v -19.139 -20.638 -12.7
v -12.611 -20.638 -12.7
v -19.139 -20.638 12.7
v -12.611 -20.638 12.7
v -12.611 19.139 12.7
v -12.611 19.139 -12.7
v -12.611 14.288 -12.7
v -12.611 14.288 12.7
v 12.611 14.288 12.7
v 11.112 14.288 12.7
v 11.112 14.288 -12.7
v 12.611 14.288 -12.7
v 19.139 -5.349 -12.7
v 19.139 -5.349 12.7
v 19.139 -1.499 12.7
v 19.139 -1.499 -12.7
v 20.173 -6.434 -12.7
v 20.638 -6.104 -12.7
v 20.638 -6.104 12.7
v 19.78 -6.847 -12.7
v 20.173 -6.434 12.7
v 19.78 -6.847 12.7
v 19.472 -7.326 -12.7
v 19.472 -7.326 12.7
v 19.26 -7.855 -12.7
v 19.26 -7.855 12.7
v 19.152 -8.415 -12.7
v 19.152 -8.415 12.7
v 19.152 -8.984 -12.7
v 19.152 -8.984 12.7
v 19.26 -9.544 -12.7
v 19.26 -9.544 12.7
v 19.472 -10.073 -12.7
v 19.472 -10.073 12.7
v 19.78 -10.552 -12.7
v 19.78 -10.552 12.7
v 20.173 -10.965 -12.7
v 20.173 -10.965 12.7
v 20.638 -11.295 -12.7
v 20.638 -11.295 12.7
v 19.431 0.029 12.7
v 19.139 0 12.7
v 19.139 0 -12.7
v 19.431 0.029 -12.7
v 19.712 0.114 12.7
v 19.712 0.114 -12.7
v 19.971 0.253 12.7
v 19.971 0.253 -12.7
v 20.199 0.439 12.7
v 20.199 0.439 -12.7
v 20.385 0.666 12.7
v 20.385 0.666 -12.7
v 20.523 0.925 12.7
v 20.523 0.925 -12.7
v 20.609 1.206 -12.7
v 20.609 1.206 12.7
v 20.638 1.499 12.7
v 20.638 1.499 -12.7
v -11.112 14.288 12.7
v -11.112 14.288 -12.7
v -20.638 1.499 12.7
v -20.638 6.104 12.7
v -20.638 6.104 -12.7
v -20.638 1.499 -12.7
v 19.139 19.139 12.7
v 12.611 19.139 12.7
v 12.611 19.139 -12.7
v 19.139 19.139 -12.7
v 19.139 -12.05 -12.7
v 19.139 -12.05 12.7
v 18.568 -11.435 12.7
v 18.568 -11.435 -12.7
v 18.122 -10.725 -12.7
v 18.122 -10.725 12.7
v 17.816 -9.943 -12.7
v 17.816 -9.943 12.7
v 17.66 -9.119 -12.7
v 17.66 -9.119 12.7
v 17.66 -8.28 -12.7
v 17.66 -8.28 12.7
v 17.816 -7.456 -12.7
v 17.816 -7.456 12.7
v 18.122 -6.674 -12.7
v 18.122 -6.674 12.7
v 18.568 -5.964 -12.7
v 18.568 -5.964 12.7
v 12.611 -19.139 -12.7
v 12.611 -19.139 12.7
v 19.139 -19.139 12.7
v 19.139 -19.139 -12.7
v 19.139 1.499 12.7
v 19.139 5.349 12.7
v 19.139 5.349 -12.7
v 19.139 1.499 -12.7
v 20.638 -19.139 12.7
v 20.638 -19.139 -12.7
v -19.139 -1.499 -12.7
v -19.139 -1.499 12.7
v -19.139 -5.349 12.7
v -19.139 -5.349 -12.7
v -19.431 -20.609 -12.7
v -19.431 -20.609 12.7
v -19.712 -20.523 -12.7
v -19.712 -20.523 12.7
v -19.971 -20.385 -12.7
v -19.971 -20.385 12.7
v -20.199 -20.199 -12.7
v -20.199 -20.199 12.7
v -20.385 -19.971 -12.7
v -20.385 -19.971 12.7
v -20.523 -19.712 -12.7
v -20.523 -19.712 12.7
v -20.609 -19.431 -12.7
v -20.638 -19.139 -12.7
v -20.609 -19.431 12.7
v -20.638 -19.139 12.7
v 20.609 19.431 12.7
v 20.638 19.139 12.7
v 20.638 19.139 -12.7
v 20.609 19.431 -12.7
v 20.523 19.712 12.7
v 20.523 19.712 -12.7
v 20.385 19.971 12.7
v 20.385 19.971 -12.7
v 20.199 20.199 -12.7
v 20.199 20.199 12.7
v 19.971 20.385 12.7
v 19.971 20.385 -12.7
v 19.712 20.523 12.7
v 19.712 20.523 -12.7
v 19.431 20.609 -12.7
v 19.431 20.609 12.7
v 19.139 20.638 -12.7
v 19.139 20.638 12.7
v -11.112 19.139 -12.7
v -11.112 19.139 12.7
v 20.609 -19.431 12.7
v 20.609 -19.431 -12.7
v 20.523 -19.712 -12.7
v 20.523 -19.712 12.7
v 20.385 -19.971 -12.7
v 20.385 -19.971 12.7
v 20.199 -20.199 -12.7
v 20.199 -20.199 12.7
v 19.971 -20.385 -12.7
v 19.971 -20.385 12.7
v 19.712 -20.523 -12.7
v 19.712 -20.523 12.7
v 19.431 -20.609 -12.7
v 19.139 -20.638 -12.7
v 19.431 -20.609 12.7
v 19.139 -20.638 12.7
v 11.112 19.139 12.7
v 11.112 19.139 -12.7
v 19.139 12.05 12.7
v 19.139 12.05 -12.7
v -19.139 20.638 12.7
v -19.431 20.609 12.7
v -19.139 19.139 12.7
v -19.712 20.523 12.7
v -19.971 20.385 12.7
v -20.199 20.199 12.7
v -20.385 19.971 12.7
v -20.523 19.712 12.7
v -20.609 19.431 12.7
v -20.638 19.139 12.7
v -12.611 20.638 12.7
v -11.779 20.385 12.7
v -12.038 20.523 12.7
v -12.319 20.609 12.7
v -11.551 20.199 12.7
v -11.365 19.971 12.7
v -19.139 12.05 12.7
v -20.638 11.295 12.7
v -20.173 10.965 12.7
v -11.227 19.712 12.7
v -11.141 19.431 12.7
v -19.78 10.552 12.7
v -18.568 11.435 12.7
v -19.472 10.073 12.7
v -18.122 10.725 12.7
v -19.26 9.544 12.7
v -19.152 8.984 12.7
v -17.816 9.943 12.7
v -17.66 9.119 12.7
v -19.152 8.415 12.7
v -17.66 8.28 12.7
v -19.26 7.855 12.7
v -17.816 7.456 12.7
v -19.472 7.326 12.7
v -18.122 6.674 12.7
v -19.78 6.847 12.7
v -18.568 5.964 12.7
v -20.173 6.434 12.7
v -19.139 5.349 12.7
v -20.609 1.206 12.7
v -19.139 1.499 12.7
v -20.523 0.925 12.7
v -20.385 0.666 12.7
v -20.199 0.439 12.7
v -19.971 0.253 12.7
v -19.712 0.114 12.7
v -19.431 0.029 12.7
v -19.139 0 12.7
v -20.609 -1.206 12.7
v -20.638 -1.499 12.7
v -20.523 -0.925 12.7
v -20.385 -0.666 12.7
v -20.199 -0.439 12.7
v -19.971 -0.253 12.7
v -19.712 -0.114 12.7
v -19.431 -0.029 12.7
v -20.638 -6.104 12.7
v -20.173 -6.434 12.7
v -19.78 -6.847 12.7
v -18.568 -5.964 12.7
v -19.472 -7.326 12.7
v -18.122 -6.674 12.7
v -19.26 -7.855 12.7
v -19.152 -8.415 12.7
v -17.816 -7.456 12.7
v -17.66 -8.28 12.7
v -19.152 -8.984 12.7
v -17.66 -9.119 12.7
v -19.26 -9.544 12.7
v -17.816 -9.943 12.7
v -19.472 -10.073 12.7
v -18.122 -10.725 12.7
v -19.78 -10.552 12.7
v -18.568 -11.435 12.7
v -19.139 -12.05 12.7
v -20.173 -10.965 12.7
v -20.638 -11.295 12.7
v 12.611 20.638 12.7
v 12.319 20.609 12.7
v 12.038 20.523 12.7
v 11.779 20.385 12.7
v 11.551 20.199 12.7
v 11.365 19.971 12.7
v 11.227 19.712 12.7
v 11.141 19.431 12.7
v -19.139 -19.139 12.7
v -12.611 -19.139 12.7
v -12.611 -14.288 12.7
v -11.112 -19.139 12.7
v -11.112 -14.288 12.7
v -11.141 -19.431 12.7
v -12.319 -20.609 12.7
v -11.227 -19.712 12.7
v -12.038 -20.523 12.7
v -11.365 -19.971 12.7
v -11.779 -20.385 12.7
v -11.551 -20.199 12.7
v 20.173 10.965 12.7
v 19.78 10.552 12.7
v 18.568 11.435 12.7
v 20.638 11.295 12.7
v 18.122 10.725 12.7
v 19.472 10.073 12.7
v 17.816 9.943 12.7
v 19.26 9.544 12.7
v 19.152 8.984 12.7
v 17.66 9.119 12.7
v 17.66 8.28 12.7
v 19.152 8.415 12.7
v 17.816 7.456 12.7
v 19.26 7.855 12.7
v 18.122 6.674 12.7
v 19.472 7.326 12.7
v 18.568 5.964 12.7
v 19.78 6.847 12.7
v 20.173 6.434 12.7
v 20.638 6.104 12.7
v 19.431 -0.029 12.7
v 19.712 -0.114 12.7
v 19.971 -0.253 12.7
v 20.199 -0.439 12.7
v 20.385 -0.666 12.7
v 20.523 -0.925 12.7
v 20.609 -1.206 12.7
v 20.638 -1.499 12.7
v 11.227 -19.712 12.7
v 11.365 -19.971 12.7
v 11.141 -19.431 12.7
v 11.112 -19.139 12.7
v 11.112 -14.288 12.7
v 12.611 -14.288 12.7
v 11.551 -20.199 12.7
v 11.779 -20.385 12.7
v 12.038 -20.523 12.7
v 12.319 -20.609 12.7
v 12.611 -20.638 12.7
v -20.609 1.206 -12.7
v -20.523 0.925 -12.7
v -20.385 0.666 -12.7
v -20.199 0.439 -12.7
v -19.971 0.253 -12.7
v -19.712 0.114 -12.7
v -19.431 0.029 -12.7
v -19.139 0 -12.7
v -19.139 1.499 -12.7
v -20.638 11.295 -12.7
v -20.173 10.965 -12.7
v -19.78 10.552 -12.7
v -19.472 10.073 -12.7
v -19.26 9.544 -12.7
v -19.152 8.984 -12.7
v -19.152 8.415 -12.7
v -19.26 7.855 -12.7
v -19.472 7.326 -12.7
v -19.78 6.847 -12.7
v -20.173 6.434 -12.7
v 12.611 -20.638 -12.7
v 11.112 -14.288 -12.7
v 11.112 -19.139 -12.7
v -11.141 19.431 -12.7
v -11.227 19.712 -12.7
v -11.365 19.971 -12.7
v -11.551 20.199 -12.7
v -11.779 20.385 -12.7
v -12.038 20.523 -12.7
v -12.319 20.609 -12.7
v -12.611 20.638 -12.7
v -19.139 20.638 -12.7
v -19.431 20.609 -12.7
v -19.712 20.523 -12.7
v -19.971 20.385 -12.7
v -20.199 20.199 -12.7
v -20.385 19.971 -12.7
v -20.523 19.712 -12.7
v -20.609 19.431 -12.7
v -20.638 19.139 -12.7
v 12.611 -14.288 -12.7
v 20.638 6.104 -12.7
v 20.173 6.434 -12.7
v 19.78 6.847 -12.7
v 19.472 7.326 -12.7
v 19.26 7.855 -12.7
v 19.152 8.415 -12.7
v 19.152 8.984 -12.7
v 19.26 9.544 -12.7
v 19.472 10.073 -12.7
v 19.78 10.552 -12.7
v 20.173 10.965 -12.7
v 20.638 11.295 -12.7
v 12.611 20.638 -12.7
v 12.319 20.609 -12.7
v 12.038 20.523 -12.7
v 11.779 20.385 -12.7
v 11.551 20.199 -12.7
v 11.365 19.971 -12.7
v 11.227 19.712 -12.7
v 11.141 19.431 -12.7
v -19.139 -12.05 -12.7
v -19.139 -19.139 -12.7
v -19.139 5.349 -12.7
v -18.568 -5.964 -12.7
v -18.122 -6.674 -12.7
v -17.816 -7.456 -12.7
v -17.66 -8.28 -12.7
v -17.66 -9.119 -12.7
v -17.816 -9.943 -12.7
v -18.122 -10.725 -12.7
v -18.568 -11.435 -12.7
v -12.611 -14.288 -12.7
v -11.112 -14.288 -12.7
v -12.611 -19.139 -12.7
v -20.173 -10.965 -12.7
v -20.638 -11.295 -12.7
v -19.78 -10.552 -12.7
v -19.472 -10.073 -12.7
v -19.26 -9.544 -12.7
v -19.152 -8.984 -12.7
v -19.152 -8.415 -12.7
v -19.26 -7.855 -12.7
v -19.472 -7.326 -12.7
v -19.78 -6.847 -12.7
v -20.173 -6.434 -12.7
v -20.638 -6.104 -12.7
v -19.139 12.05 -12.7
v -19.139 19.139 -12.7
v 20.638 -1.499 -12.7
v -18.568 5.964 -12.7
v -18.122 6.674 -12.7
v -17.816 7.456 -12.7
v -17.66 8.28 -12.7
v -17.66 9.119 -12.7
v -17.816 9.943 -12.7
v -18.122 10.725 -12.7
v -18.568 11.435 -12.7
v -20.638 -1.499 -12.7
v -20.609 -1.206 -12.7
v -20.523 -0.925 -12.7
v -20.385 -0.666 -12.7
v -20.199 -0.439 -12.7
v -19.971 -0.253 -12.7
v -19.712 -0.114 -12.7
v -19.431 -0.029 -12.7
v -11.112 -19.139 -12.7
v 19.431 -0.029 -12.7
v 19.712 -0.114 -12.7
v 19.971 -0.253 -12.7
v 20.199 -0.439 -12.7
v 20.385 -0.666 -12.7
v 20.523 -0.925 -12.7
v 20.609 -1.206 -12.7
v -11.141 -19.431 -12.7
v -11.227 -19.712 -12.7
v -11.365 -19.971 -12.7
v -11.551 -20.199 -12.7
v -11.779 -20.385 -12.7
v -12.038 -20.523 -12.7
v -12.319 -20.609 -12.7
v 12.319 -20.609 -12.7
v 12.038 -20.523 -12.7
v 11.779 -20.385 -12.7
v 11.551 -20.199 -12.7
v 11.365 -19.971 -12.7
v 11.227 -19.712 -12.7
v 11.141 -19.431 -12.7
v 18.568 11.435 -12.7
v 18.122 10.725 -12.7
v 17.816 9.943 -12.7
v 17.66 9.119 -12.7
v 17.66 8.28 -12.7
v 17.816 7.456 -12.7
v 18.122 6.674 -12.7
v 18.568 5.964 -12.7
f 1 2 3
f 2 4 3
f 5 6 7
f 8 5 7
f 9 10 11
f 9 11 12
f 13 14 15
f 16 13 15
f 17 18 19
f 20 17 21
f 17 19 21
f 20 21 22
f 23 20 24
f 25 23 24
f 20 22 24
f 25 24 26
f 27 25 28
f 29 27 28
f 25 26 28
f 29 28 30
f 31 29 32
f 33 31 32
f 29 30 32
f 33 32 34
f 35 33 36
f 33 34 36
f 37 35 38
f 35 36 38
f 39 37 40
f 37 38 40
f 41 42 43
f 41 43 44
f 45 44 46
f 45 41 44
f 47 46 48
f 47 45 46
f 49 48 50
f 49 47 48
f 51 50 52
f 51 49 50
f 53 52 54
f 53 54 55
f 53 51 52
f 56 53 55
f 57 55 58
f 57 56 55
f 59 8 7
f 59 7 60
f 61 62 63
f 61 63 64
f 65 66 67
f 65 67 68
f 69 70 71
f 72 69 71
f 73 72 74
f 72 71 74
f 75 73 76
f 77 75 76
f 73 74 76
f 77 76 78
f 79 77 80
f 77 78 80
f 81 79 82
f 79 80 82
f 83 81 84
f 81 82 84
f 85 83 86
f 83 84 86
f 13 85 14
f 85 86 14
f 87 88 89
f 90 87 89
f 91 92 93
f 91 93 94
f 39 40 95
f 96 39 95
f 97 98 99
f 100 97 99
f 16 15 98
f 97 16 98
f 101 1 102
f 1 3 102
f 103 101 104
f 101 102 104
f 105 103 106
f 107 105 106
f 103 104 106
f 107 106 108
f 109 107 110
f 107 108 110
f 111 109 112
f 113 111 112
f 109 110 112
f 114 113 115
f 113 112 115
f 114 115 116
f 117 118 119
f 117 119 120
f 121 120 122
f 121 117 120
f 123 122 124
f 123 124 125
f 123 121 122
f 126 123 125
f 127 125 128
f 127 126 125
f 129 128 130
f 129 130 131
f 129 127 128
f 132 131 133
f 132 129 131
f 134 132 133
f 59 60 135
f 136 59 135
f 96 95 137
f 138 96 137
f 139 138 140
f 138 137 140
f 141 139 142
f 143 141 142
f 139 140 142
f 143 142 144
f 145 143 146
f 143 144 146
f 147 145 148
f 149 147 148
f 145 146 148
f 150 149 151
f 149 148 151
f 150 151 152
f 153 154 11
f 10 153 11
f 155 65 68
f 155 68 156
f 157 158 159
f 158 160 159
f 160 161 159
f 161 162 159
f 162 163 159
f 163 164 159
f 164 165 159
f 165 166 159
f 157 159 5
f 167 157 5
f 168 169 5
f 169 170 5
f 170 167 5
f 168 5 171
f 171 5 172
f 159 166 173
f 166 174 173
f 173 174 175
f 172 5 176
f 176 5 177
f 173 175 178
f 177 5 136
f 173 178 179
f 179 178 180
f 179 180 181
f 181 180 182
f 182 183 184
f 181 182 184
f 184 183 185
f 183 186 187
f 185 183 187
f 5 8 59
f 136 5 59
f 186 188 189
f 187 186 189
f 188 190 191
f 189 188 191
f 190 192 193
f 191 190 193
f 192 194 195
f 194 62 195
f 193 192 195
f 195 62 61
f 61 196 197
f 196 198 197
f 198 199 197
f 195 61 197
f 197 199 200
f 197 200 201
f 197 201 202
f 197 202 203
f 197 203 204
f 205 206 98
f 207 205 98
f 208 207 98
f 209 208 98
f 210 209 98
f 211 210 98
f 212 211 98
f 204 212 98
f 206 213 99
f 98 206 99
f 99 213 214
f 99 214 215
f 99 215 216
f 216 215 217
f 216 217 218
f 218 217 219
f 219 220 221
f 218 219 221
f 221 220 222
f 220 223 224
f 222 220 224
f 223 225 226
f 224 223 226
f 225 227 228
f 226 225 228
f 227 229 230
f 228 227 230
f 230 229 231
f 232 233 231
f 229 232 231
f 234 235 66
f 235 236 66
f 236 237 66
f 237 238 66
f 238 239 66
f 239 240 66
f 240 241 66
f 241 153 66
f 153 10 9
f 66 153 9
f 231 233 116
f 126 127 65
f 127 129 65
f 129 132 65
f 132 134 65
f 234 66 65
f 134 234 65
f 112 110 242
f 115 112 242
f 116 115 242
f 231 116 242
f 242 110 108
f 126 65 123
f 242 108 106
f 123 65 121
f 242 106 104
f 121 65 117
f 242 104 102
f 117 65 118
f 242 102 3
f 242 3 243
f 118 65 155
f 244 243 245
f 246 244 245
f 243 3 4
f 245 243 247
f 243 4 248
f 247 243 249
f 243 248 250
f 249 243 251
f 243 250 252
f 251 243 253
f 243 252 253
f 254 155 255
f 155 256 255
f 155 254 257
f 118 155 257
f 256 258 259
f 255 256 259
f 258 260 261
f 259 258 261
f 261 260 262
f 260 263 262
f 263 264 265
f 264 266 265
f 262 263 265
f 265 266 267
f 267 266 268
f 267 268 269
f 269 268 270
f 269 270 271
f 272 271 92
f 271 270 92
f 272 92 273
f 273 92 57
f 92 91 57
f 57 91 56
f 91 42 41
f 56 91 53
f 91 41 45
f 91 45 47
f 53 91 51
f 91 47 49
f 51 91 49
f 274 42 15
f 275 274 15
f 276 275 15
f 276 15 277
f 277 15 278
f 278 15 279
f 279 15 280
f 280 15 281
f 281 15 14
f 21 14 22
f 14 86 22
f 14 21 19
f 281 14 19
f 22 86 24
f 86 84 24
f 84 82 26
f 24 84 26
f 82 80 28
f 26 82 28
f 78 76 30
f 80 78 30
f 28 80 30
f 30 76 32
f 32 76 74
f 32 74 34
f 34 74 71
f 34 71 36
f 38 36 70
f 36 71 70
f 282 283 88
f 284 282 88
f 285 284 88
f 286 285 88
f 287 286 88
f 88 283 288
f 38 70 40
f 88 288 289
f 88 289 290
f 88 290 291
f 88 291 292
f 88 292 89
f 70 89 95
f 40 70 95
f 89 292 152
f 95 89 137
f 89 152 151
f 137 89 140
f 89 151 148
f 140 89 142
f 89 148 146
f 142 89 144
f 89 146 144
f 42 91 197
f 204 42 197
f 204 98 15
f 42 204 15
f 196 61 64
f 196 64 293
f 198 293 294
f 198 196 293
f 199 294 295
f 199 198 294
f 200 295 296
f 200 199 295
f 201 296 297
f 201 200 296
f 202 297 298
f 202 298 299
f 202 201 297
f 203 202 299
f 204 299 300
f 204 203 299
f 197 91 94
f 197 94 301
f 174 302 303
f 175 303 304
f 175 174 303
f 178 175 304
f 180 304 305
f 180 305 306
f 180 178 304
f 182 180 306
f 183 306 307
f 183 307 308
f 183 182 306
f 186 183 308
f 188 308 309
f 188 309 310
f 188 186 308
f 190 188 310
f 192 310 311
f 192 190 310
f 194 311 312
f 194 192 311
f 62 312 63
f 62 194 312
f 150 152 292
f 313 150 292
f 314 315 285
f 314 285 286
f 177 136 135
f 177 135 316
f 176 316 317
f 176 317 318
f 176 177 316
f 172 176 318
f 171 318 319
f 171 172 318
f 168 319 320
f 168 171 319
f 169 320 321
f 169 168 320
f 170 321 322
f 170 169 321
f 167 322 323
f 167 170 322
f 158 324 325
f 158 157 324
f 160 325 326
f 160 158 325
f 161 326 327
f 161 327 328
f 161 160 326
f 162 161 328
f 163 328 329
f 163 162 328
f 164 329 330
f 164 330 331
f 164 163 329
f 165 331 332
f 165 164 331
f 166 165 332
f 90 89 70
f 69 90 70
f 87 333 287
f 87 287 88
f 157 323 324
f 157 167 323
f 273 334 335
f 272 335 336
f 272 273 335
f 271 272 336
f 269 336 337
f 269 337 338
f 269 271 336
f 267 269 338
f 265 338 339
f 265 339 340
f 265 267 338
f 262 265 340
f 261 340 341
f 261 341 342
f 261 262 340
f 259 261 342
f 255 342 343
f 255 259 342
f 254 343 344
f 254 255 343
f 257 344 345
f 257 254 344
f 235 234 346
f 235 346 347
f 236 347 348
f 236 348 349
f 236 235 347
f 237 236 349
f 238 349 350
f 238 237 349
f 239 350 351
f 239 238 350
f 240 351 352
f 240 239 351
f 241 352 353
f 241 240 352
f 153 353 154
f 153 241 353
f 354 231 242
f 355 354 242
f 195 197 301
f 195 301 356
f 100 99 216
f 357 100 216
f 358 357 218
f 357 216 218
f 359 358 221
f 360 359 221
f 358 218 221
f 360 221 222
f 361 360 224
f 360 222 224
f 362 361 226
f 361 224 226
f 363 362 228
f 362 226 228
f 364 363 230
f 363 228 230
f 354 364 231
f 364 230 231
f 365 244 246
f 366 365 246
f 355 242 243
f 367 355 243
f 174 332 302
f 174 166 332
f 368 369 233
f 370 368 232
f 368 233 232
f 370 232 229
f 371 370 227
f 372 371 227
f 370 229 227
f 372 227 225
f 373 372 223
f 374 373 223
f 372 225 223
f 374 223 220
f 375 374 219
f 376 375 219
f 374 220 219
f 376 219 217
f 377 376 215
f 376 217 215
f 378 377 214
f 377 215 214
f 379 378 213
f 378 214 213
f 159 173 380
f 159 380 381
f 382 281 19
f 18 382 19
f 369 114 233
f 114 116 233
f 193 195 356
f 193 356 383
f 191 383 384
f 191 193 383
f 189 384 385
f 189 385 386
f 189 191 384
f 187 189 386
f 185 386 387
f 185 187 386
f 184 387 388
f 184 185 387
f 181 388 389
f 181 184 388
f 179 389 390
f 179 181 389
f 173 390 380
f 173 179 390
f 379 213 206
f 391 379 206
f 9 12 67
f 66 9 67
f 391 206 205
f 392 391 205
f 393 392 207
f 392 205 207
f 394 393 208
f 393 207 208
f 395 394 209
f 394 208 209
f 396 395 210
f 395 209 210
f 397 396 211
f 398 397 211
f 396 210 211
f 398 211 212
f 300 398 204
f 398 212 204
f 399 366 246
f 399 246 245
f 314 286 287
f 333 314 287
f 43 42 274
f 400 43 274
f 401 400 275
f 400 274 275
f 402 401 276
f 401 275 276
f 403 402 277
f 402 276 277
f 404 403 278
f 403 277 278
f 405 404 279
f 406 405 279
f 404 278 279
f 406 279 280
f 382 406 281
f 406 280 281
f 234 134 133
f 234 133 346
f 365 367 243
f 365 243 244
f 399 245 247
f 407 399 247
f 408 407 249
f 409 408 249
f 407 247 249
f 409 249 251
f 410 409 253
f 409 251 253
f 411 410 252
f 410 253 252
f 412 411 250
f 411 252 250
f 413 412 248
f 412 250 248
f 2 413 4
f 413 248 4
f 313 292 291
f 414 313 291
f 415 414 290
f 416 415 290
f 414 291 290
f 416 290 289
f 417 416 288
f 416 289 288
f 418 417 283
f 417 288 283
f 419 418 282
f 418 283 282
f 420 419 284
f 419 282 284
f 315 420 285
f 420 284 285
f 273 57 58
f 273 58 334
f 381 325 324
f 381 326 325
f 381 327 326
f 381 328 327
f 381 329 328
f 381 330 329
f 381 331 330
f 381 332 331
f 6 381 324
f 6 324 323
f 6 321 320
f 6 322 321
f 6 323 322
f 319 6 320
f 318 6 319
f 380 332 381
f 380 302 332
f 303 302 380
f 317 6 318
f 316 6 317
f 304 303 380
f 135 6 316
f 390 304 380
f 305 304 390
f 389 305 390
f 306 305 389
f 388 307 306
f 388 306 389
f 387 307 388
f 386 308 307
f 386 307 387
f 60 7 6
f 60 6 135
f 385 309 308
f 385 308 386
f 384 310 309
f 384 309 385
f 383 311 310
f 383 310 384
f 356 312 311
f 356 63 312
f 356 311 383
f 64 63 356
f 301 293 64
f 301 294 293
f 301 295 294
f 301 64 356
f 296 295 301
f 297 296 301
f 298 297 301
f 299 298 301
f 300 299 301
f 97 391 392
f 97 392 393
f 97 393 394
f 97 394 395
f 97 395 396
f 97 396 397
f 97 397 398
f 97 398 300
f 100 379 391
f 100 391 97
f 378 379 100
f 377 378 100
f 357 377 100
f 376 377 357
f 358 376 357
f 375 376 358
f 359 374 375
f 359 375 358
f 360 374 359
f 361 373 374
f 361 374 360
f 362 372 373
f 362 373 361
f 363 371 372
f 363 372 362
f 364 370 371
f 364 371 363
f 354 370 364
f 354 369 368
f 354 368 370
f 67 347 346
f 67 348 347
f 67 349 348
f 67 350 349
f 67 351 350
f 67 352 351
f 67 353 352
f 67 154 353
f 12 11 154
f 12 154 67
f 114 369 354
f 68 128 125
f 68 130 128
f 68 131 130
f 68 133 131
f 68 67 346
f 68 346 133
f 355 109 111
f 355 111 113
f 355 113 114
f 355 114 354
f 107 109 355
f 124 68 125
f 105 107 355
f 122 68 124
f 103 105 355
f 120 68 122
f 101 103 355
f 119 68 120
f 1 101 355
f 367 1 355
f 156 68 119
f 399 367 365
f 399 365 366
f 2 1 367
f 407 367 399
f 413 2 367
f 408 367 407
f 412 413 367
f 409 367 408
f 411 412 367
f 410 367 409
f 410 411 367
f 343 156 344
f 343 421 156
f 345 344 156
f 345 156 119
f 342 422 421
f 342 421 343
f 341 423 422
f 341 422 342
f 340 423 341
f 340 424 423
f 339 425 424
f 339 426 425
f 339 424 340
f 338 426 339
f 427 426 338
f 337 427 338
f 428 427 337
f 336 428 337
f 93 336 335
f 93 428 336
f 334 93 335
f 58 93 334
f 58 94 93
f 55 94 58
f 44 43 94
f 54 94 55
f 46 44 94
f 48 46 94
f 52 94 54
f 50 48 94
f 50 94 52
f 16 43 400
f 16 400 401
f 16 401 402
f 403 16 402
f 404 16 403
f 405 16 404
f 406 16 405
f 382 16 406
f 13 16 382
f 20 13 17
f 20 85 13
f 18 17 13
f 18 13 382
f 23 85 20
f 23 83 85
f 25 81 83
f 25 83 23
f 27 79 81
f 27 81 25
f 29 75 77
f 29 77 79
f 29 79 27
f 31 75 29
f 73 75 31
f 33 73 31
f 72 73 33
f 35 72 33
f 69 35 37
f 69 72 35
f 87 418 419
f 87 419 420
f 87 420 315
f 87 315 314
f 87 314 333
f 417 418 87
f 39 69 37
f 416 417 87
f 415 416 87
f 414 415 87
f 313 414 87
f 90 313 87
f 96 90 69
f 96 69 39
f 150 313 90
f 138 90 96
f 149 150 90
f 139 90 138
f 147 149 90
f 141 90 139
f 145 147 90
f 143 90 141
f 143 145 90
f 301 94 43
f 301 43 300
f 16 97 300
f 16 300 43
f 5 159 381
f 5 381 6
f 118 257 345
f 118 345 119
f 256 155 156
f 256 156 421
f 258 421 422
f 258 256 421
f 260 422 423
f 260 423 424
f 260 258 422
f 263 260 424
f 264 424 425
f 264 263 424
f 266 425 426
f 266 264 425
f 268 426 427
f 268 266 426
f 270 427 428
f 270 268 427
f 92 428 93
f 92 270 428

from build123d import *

# Parameters (mm, degrees)
BASE_EXTRUDE_DEPTH = 12.7


with BuildPart() as part:
    # Sketch1 → Base-Extrude (new, symmetric)
    with BuildSketch(Plane.XY):
        with BuildLine():
            Line((-20.6375, 19.1389), (-20.6375, 11.29515134))
            ThreePointArc((-20.6375, 11.29515134), (-19.1389, 8.6995), (-20.6375, 6.10384866))
            Line((-20.6375, 6.10384866), (-20.6375, 1.4986))
            ThreePointArc((-20.6375, 1.4986), (-20.198570222, 0.438929778), (-19.1389, 0))
            Line((-19.1389, 0), (19.1389, 0))
            ThreePointArc((19.1389, 0), (20.198570222, 0.438929778), (20.6375, 1.4986))
            Line((20.6375, 1.4986), (20.6375, 6.10384866))
            ThreePointArc((20.6375, 6.10384866), (19.1389, 8.6995), (20.6375, 11.29515134))
            Line((20.6375, 11.29515134), (20.6375, 19.1389))
            ThreePointArc((20.6375, 19.1389), (20.198570222, 20.198570222), (19.1389, 20.6375))
            Line((19.1389, 20.6375), (12.6111, 20.6375))
            ThreePointArc((12.6111, 20.6375), (11.551429778, 20.198570222), (11.1125, 19.1389))
            Line((11.1125, 19.1389), (11.1125, 14.2875))
            Line((11.1125, 14.2875), (12.6111, 14.2875))
            Line((12.6111, 14.2875), (12.6111, 19.1389))
            Line((12.6111, 19.1389), (19.1389, 19.1389))
            Line((19.1389, 19.1389), (19.1389, 12.050471471))
            ThreePointArc((19.1389, 12.050471471), (17.6403, 8.6995), (19.1389, 5.348528529))
            Line((19.1389, 5.348528529), (19.1389, 1.4986))
            Line((19.1389, 1.4986), (-19.1389, 1.4986))
            Line((-19.1389, 1.4986), (-19.1389, 5.348528529))
            ThreePointArc((-19.1389, 5.348528529), (-17.6403, 8.6995), (-19.1389, 12.050471471))
            Line((-19.1389, 12.050471471), (-19.1389, 19.1389))
            Line((-19.1389, 19.1389), (-12.6111, 19.1389))
            Line((-12.6111, 19.1389), (-12.6111, 14.2875))
            Line((-12.6111, 14.2875), (-11.1125, 14.2875))
            Line((-11.1125, 14.2875), (-11.1125, 19.1389))
            ThreePointArc((-11.1125, 19.1389), (-11.551429778, 20.198570222), (-12.6111, 20.6375))
            Line((-12.6111, 20.6375), (-19.1389, 20.6375))
            ThreePointArc((-19.1389, 20.6375), (-20.198570222, 20.198570222), (-20.6375, 19.1389))
        make_face()
    base_extrude = extrude(amount=BASE_EXTRUDE_DEPTH, both=True)

    # Mirror1: Base-Extrude across plane
    add(base_extrude.mirror(Plane.ZX))


solid = part.part
